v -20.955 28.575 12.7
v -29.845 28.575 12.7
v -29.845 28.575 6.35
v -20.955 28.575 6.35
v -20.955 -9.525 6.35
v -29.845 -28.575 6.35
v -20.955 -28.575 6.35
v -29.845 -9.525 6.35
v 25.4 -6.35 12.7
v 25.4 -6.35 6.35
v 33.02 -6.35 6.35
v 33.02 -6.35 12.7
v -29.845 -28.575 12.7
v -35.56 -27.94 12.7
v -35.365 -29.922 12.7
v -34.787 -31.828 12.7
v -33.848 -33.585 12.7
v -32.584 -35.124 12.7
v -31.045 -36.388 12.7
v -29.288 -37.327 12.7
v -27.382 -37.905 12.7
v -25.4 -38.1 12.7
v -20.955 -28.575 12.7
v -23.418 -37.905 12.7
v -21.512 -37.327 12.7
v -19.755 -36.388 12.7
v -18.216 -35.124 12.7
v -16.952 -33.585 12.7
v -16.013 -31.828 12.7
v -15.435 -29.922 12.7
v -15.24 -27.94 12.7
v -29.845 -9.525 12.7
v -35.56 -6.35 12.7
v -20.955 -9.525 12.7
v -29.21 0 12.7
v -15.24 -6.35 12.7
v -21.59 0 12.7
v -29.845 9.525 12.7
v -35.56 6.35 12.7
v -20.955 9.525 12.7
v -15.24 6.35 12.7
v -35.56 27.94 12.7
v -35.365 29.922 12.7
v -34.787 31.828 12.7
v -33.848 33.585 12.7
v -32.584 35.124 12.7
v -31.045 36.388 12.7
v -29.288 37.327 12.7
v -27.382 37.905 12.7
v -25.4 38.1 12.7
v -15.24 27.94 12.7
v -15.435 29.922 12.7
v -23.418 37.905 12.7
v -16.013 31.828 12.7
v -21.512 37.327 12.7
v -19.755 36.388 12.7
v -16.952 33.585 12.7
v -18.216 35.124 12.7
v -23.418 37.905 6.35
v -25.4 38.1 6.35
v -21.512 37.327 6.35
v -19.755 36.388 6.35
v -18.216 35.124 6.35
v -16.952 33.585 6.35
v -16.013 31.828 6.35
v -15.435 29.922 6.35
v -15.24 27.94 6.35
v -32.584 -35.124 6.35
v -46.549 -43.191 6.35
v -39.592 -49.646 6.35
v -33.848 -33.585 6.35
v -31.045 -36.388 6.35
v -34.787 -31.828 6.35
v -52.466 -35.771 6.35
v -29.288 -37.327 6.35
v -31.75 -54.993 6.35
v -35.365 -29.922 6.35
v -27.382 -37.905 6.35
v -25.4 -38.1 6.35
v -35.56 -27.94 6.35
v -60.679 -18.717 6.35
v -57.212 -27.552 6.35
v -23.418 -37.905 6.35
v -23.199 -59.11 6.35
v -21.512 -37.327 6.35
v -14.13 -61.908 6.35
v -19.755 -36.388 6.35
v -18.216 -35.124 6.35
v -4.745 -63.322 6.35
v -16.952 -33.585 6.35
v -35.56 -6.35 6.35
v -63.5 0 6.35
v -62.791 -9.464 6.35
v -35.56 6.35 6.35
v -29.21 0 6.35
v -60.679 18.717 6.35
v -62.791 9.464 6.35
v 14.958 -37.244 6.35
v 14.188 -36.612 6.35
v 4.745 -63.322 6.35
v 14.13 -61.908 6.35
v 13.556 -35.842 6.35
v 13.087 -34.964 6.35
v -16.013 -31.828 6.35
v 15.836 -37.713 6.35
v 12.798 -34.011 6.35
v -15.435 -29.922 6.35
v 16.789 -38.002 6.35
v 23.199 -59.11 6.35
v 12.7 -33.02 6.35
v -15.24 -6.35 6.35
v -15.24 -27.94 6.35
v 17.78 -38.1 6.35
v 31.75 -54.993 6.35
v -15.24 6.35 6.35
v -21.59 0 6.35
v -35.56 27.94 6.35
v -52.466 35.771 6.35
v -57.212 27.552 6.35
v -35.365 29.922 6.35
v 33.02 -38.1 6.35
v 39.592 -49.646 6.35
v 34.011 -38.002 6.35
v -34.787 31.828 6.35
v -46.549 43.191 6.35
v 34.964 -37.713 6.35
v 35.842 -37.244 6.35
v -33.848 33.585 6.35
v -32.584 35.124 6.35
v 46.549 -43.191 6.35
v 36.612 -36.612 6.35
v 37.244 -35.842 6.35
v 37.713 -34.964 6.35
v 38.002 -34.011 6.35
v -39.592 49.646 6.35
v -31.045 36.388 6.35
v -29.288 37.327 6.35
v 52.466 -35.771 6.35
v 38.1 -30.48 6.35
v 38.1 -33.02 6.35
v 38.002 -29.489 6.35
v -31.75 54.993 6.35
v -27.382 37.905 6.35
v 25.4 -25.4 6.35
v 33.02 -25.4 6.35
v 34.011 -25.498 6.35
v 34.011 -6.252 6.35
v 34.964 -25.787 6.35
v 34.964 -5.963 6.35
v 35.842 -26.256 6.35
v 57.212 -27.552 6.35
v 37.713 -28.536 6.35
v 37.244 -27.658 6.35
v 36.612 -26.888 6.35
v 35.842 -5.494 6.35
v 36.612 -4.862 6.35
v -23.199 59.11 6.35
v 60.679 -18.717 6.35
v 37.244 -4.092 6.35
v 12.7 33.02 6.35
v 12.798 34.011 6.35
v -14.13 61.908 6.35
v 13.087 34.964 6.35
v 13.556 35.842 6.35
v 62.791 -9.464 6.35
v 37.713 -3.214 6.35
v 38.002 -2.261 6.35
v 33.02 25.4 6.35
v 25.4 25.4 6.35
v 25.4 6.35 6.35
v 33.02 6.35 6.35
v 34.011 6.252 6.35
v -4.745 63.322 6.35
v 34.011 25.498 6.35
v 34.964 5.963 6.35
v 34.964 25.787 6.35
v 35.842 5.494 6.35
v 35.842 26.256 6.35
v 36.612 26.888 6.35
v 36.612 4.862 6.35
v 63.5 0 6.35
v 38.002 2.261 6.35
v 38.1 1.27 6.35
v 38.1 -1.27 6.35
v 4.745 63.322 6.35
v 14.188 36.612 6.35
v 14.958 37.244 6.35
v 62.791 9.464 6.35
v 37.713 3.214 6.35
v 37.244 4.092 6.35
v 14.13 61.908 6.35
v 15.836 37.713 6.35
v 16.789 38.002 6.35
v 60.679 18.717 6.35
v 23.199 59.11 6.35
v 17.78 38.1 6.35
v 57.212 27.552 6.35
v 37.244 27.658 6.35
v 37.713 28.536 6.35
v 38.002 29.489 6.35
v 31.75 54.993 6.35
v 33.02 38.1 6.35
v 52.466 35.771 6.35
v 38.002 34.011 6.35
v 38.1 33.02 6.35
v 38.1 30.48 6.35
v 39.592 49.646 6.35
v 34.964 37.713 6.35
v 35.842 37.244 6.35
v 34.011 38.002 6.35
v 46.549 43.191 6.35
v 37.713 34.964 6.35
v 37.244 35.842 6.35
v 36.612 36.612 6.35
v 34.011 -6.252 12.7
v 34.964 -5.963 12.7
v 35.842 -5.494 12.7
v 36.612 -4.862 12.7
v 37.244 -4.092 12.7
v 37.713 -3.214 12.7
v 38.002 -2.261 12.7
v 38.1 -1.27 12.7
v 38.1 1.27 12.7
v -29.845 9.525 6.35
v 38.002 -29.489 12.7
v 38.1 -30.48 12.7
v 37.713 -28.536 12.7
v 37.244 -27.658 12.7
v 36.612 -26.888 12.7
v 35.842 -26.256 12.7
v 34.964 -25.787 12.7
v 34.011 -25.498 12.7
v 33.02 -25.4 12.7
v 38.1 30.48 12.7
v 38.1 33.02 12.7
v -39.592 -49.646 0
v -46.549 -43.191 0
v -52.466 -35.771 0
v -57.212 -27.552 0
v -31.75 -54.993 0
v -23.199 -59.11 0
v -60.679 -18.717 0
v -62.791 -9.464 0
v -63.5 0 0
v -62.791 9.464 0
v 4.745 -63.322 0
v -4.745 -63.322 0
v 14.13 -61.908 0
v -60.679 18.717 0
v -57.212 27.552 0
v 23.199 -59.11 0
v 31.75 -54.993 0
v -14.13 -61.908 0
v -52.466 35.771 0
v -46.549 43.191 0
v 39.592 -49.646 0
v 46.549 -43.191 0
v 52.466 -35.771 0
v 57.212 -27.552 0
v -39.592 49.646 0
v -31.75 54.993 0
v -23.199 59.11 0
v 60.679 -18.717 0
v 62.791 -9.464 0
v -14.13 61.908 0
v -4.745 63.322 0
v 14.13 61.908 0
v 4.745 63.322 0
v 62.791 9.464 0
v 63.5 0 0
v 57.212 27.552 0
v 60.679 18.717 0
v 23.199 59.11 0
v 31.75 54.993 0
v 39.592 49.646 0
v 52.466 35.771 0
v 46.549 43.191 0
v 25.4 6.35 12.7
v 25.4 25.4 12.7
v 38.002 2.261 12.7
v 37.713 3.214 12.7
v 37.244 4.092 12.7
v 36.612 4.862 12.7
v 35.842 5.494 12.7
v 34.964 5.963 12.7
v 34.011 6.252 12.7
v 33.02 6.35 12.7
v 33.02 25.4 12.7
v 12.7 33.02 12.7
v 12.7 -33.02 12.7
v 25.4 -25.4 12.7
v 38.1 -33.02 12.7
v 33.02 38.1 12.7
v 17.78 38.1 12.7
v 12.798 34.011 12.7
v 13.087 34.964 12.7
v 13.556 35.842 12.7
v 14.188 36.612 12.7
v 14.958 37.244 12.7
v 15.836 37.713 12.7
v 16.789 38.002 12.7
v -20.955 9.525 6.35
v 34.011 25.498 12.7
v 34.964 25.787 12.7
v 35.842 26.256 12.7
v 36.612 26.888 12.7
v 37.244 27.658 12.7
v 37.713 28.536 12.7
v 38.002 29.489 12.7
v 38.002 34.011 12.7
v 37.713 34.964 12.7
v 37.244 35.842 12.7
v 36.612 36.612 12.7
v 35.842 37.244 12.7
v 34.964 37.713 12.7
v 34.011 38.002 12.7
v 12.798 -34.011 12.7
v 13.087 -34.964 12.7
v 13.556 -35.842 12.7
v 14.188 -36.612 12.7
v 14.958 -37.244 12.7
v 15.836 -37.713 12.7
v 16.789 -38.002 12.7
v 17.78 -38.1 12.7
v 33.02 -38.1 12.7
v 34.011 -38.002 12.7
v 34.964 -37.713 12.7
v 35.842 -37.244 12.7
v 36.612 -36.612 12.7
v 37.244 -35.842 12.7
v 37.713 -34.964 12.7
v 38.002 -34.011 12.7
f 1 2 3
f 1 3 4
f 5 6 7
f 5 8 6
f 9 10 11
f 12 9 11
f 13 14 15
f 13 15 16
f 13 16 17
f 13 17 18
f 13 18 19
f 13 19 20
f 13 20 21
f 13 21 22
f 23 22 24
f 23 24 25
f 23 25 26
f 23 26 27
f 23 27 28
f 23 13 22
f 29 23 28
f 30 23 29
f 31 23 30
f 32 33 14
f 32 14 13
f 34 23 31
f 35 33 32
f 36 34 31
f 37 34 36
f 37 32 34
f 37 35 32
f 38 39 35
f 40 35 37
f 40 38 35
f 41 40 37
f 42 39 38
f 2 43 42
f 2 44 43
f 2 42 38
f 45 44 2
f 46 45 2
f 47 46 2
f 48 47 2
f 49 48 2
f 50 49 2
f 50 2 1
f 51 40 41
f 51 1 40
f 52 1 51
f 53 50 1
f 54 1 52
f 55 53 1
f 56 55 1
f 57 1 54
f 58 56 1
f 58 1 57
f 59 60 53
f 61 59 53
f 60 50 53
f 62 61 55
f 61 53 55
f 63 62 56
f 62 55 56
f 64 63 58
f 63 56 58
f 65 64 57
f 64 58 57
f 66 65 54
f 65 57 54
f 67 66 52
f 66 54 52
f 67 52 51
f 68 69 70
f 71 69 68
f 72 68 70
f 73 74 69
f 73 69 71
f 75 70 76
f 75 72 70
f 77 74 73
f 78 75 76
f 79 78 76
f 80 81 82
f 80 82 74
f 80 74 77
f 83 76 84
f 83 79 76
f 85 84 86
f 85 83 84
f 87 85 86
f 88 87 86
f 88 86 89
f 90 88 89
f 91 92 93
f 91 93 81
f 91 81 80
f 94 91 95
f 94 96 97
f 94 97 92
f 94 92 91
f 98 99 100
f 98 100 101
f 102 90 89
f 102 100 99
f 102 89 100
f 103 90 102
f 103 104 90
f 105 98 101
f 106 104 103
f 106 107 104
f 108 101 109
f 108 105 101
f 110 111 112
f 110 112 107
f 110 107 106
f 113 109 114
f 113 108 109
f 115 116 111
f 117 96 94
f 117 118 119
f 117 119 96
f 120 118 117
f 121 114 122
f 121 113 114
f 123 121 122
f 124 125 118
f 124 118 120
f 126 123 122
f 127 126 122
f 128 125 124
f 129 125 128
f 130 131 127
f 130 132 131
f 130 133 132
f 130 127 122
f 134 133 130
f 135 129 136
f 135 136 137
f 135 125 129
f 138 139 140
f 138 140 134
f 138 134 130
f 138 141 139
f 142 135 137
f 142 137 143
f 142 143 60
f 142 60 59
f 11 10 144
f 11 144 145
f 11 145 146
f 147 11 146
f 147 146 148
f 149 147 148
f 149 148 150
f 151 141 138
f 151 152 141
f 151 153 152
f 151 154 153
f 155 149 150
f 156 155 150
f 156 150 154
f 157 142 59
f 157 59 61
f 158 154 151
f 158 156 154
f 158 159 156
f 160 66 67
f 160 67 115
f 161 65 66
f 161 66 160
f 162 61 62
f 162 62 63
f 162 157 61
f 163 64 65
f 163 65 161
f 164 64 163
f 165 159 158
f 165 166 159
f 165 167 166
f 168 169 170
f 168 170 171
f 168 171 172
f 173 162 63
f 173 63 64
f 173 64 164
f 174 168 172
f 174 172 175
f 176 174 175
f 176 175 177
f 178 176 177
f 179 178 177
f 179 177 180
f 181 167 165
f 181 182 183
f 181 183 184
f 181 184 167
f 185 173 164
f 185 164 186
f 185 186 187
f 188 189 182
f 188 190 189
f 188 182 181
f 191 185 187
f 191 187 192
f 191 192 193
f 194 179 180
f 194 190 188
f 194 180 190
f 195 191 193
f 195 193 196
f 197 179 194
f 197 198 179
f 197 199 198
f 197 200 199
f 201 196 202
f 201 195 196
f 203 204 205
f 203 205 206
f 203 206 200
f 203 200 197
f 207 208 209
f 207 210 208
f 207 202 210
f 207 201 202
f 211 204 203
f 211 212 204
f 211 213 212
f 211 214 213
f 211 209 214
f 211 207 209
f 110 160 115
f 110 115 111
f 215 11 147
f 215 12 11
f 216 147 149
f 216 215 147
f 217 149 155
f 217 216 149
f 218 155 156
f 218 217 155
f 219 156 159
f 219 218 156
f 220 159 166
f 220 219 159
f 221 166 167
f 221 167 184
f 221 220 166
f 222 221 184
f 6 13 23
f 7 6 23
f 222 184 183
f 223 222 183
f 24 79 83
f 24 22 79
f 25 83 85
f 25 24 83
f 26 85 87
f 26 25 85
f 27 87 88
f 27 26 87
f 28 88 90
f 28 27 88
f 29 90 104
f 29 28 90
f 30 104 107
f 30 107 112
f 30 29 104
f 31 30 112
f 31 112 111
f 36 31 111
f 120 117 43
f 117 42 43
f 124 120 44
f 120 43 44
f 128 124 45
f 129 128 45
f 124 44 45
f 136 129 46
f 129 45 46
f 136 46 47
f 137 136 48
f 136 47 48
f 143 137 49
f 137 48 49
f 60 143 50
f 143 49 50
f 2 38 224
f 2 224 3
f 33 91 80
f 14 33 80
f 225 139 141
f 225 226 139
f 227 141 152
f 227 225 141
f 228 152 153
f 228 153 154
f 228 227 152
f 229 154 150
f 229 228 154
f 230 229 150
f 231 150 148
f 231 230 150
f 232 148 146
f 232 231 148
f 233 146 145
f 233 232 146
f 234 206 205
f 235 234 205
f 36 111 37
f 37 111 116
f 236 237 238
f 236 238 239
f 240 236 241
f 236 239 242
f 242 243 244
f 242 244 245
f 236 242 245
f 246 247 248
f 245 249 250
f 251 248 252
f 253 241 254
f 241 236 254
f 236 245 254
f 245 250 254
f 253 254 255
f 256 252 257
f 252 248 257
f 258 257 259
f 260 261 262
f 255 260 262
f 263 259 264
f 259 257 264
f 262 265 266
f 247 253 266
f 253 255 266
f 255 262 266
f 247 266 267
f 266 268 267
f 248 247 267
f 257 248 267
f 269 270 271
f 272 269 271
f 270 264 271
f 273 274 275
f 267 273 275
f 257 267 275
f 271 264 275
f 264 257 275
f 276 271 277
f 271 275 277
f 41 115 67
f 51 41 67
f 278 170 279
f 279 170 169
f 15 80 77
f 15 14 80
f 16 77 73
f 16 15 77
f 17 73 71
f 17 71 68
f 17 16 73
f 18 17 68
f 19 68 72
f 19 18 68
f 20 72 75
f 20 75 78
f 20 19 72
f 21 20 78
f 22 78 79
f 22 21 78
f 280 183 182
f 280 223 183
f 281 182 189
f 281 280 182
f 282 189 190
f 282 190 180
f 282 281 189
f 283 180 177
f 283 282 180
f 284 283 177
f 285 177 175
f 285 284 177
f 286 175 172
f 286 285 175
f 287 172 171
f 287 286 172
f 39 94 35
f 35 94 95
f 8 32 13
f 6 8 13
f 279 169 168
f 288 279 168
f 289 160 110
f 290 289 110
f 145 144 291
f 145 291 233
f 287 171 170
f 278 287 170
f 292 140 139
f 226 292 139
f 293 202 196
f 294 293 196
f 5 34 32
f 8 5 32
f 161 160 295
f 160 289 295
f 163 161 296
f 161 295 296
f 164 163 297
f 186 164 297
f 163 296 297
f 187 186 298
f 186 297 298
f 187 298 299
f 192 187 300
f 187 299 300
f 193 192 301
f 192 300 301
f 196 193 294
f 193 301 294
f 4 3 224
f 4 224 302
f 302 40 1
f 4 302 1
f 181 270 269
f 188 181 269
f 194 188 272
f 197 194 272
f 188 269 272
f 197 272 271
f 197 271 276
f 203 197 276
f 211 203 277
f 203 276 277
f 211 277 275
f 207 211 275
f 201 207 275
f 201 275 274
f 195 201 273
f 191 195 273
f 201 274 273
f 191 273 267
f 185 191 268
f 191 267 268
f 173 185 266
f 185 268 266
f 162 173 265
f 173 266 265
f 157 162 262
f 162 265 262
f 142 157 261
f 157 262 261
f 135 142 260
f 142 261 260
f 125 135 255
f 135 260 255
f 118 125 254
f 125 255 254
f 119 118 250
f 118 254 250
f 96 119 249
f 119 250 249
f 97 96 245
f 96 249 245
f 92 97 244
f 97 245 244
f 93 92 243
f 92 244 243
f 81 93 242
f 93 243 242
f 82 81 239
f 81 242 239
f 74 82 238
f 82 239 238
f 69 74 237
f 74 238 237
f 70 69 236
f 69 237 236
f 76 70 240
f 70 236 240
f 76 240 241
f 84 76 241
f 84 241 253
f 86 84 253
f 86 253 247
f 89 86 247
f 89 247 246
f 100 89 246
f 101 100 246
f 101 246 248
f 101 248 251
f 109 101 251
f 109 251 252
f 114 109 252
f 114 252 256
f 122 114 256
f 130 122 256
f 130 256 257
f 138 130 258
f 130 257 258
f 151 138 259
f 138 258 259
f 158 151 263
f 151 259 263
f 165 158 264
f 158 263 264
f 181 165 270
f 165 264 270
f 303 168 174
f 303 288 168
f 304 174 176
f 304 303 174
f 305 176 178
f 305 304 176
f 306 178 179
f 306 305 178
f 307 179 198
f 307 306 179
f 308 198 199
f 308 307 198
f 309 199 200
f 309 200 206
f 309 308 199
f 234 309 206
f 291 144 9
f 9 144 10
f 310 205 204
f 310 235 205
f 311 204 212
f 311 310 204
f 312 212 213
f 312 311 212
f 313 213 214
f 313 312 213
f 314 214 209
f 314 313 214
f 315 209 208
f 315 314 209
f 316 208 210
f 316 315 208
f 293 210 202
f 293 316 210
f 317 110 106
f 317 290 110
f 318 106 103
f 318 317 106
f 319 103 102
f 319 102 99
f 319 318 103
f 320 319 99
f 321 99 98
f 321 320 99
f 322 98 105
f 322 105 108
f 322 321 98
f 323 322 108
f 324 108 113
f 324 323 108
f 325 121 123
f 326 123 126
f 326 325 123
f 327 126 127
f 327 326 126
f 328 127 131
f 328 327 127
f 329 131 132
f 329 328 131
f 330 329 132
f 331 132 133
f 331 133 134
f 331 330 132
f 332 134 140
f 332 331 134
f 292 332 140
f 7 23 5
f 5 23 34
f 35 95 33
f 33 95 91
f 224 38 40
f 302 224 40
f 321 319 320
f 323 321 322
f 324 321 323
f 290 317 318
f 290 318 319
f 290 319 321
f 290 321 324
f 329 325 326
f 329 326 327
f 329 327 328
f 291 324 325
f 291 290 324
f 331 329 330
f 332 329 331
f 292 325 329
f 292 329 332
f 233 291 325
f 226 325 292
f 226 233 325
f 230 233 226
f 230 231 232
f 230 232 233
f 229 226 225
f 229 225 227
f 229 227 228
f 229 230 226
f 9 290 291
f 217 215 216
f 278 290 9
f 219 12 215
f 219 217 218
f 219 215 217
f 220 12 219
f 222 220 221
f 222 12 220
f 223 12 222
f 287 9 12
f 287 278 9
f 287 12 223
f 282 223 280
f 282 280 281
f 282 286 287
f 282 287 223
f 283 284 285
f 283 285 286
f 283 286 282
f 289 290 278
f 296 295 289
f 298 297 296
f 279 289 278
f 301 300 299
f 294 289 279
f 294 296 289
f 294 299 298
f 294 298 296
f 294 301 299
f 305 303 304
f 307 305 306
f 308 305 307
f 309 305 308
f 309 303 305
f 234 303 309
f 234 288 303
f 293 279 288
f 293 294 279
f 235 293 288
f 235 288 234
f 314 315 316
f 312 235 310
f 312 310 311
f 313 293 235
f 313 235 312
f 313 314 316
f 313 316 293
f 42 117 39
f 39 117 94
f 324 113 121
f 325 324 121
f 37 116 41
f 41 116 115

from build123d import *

# Parameters (mm, degrees)
F0_R     = 63.5
F1_DEPTH = 6.35
F3_DEPTH = 6.35
F4_W     = 12.7
F4_H     = 12.7
F5_DEPTH = 6.35
F6_R     = 10.15999
F7_R     = 5.08
F8_W     = 8.89
F8_H     = 19.05
F9_DEPTH = 6.35


# Not quite as in the source:
# - a fillet or chamfer is up to 0.001 mm smaller than in the source, because OpenCascade refuses the exact size
# - a feature names something its author has since deleted; it is built from what else it names


with BuildPart() as f1:
    # F0 (on Top) → F1 (new body)
    with BuildSketch(Plane.XY):
        Circle(F0_R)
    extrude(amount=F1_DEPTH)

    # F2 (on face) → F3 (join)
    with BuildSketch(Plane.XY.offset(6.35)):
        Polygon((-21.59, 0), (-25.4, 0), (-29.21, 0), (-35.56, -6.35), (-35.56, -38.1), (-15.24, -38.1), (-15.24, -6.35), align=None)
        Polygon((-29.21, 0), (-25.4, 0), (-21.59, 0), (-15.24, 6.35), (-15.24, 38.1), (-35.56, 38.1), (-35.56, 6.35), align=None)
    extrude(amount=F3_DEPTH)

    # F4 (on face) → F5 (join)
    with BuildSketch(Plane.XY.offset(6.35)):
        Polygon((12.7, 38.1), (12.7, 0), (12.7, -38.1), (25.4, -38.1), (25.4, -25.4), (25.4, -6.35), (25.4, 0), (25.4, 6.35), (25.4, 25.4), (25.4, 38.1), align=None)
        with Locations((31.75, 31.75)):
            Rectangle(F4_W, F4_H)
        with Locations((31.75, -31.75)):
            Rectangle(F4_W, F4_H)
        Polygon((38.1, 6.35), (25.4, 6.35), (25.4, 0), (25.4, -6.35), (38.1, -6.35), align=None)
    extrude(amount=F5_DEPTH)

    # F6 (radius 10.16 in the source; OpenCascade refuses exactly that, so slightly less here)
    f6_edges = [f1.edges().sort_by_distance(p)[0] for p in [
        (-35.56, -38.1, 9.525),
        (-15.24, -38.1, 9.525),
        (-15.24, 38.1, 9.525),
        (-35.56, 38.1, 9.525),
    ]]
    fillet(f6_edges, radius=F6_R)

    # F7
    f7_edges = [f1.edges().sort_by_distance(p)[0] for p in [
        (38.1, 6.35, 9.525),
        (38.1, -6.35, 9.525),
        (38.1, -38.1, 9.525),
        (38.1, -25.4, 9.525),
        (38.1, 25.4, 9.525),
        (38.1, 38.1, 9.525),
        (12.7, 38.1, 9.525),
        (12.7, -38.1, 9.525),
    ]]
    fillet(f7_edges, radius=F7_R)

    # F8 (on face) → F9 (cut)
    with BuildSketch(Plane.XY.offset(12.7)):
        Polygon((-29.845, -28.575), (-20.955, -28.575), (-20.955, -9.525), (-25.4, -9.525), (-29.845, -9.525), align=None)
        with Locations((-25.4, 19.05)):
            Rectangle(F8_W, F8_H)
    extrude(amount=-F9_DEPTH, mode=Mode.SUBTRACT)


solid = f1.part
